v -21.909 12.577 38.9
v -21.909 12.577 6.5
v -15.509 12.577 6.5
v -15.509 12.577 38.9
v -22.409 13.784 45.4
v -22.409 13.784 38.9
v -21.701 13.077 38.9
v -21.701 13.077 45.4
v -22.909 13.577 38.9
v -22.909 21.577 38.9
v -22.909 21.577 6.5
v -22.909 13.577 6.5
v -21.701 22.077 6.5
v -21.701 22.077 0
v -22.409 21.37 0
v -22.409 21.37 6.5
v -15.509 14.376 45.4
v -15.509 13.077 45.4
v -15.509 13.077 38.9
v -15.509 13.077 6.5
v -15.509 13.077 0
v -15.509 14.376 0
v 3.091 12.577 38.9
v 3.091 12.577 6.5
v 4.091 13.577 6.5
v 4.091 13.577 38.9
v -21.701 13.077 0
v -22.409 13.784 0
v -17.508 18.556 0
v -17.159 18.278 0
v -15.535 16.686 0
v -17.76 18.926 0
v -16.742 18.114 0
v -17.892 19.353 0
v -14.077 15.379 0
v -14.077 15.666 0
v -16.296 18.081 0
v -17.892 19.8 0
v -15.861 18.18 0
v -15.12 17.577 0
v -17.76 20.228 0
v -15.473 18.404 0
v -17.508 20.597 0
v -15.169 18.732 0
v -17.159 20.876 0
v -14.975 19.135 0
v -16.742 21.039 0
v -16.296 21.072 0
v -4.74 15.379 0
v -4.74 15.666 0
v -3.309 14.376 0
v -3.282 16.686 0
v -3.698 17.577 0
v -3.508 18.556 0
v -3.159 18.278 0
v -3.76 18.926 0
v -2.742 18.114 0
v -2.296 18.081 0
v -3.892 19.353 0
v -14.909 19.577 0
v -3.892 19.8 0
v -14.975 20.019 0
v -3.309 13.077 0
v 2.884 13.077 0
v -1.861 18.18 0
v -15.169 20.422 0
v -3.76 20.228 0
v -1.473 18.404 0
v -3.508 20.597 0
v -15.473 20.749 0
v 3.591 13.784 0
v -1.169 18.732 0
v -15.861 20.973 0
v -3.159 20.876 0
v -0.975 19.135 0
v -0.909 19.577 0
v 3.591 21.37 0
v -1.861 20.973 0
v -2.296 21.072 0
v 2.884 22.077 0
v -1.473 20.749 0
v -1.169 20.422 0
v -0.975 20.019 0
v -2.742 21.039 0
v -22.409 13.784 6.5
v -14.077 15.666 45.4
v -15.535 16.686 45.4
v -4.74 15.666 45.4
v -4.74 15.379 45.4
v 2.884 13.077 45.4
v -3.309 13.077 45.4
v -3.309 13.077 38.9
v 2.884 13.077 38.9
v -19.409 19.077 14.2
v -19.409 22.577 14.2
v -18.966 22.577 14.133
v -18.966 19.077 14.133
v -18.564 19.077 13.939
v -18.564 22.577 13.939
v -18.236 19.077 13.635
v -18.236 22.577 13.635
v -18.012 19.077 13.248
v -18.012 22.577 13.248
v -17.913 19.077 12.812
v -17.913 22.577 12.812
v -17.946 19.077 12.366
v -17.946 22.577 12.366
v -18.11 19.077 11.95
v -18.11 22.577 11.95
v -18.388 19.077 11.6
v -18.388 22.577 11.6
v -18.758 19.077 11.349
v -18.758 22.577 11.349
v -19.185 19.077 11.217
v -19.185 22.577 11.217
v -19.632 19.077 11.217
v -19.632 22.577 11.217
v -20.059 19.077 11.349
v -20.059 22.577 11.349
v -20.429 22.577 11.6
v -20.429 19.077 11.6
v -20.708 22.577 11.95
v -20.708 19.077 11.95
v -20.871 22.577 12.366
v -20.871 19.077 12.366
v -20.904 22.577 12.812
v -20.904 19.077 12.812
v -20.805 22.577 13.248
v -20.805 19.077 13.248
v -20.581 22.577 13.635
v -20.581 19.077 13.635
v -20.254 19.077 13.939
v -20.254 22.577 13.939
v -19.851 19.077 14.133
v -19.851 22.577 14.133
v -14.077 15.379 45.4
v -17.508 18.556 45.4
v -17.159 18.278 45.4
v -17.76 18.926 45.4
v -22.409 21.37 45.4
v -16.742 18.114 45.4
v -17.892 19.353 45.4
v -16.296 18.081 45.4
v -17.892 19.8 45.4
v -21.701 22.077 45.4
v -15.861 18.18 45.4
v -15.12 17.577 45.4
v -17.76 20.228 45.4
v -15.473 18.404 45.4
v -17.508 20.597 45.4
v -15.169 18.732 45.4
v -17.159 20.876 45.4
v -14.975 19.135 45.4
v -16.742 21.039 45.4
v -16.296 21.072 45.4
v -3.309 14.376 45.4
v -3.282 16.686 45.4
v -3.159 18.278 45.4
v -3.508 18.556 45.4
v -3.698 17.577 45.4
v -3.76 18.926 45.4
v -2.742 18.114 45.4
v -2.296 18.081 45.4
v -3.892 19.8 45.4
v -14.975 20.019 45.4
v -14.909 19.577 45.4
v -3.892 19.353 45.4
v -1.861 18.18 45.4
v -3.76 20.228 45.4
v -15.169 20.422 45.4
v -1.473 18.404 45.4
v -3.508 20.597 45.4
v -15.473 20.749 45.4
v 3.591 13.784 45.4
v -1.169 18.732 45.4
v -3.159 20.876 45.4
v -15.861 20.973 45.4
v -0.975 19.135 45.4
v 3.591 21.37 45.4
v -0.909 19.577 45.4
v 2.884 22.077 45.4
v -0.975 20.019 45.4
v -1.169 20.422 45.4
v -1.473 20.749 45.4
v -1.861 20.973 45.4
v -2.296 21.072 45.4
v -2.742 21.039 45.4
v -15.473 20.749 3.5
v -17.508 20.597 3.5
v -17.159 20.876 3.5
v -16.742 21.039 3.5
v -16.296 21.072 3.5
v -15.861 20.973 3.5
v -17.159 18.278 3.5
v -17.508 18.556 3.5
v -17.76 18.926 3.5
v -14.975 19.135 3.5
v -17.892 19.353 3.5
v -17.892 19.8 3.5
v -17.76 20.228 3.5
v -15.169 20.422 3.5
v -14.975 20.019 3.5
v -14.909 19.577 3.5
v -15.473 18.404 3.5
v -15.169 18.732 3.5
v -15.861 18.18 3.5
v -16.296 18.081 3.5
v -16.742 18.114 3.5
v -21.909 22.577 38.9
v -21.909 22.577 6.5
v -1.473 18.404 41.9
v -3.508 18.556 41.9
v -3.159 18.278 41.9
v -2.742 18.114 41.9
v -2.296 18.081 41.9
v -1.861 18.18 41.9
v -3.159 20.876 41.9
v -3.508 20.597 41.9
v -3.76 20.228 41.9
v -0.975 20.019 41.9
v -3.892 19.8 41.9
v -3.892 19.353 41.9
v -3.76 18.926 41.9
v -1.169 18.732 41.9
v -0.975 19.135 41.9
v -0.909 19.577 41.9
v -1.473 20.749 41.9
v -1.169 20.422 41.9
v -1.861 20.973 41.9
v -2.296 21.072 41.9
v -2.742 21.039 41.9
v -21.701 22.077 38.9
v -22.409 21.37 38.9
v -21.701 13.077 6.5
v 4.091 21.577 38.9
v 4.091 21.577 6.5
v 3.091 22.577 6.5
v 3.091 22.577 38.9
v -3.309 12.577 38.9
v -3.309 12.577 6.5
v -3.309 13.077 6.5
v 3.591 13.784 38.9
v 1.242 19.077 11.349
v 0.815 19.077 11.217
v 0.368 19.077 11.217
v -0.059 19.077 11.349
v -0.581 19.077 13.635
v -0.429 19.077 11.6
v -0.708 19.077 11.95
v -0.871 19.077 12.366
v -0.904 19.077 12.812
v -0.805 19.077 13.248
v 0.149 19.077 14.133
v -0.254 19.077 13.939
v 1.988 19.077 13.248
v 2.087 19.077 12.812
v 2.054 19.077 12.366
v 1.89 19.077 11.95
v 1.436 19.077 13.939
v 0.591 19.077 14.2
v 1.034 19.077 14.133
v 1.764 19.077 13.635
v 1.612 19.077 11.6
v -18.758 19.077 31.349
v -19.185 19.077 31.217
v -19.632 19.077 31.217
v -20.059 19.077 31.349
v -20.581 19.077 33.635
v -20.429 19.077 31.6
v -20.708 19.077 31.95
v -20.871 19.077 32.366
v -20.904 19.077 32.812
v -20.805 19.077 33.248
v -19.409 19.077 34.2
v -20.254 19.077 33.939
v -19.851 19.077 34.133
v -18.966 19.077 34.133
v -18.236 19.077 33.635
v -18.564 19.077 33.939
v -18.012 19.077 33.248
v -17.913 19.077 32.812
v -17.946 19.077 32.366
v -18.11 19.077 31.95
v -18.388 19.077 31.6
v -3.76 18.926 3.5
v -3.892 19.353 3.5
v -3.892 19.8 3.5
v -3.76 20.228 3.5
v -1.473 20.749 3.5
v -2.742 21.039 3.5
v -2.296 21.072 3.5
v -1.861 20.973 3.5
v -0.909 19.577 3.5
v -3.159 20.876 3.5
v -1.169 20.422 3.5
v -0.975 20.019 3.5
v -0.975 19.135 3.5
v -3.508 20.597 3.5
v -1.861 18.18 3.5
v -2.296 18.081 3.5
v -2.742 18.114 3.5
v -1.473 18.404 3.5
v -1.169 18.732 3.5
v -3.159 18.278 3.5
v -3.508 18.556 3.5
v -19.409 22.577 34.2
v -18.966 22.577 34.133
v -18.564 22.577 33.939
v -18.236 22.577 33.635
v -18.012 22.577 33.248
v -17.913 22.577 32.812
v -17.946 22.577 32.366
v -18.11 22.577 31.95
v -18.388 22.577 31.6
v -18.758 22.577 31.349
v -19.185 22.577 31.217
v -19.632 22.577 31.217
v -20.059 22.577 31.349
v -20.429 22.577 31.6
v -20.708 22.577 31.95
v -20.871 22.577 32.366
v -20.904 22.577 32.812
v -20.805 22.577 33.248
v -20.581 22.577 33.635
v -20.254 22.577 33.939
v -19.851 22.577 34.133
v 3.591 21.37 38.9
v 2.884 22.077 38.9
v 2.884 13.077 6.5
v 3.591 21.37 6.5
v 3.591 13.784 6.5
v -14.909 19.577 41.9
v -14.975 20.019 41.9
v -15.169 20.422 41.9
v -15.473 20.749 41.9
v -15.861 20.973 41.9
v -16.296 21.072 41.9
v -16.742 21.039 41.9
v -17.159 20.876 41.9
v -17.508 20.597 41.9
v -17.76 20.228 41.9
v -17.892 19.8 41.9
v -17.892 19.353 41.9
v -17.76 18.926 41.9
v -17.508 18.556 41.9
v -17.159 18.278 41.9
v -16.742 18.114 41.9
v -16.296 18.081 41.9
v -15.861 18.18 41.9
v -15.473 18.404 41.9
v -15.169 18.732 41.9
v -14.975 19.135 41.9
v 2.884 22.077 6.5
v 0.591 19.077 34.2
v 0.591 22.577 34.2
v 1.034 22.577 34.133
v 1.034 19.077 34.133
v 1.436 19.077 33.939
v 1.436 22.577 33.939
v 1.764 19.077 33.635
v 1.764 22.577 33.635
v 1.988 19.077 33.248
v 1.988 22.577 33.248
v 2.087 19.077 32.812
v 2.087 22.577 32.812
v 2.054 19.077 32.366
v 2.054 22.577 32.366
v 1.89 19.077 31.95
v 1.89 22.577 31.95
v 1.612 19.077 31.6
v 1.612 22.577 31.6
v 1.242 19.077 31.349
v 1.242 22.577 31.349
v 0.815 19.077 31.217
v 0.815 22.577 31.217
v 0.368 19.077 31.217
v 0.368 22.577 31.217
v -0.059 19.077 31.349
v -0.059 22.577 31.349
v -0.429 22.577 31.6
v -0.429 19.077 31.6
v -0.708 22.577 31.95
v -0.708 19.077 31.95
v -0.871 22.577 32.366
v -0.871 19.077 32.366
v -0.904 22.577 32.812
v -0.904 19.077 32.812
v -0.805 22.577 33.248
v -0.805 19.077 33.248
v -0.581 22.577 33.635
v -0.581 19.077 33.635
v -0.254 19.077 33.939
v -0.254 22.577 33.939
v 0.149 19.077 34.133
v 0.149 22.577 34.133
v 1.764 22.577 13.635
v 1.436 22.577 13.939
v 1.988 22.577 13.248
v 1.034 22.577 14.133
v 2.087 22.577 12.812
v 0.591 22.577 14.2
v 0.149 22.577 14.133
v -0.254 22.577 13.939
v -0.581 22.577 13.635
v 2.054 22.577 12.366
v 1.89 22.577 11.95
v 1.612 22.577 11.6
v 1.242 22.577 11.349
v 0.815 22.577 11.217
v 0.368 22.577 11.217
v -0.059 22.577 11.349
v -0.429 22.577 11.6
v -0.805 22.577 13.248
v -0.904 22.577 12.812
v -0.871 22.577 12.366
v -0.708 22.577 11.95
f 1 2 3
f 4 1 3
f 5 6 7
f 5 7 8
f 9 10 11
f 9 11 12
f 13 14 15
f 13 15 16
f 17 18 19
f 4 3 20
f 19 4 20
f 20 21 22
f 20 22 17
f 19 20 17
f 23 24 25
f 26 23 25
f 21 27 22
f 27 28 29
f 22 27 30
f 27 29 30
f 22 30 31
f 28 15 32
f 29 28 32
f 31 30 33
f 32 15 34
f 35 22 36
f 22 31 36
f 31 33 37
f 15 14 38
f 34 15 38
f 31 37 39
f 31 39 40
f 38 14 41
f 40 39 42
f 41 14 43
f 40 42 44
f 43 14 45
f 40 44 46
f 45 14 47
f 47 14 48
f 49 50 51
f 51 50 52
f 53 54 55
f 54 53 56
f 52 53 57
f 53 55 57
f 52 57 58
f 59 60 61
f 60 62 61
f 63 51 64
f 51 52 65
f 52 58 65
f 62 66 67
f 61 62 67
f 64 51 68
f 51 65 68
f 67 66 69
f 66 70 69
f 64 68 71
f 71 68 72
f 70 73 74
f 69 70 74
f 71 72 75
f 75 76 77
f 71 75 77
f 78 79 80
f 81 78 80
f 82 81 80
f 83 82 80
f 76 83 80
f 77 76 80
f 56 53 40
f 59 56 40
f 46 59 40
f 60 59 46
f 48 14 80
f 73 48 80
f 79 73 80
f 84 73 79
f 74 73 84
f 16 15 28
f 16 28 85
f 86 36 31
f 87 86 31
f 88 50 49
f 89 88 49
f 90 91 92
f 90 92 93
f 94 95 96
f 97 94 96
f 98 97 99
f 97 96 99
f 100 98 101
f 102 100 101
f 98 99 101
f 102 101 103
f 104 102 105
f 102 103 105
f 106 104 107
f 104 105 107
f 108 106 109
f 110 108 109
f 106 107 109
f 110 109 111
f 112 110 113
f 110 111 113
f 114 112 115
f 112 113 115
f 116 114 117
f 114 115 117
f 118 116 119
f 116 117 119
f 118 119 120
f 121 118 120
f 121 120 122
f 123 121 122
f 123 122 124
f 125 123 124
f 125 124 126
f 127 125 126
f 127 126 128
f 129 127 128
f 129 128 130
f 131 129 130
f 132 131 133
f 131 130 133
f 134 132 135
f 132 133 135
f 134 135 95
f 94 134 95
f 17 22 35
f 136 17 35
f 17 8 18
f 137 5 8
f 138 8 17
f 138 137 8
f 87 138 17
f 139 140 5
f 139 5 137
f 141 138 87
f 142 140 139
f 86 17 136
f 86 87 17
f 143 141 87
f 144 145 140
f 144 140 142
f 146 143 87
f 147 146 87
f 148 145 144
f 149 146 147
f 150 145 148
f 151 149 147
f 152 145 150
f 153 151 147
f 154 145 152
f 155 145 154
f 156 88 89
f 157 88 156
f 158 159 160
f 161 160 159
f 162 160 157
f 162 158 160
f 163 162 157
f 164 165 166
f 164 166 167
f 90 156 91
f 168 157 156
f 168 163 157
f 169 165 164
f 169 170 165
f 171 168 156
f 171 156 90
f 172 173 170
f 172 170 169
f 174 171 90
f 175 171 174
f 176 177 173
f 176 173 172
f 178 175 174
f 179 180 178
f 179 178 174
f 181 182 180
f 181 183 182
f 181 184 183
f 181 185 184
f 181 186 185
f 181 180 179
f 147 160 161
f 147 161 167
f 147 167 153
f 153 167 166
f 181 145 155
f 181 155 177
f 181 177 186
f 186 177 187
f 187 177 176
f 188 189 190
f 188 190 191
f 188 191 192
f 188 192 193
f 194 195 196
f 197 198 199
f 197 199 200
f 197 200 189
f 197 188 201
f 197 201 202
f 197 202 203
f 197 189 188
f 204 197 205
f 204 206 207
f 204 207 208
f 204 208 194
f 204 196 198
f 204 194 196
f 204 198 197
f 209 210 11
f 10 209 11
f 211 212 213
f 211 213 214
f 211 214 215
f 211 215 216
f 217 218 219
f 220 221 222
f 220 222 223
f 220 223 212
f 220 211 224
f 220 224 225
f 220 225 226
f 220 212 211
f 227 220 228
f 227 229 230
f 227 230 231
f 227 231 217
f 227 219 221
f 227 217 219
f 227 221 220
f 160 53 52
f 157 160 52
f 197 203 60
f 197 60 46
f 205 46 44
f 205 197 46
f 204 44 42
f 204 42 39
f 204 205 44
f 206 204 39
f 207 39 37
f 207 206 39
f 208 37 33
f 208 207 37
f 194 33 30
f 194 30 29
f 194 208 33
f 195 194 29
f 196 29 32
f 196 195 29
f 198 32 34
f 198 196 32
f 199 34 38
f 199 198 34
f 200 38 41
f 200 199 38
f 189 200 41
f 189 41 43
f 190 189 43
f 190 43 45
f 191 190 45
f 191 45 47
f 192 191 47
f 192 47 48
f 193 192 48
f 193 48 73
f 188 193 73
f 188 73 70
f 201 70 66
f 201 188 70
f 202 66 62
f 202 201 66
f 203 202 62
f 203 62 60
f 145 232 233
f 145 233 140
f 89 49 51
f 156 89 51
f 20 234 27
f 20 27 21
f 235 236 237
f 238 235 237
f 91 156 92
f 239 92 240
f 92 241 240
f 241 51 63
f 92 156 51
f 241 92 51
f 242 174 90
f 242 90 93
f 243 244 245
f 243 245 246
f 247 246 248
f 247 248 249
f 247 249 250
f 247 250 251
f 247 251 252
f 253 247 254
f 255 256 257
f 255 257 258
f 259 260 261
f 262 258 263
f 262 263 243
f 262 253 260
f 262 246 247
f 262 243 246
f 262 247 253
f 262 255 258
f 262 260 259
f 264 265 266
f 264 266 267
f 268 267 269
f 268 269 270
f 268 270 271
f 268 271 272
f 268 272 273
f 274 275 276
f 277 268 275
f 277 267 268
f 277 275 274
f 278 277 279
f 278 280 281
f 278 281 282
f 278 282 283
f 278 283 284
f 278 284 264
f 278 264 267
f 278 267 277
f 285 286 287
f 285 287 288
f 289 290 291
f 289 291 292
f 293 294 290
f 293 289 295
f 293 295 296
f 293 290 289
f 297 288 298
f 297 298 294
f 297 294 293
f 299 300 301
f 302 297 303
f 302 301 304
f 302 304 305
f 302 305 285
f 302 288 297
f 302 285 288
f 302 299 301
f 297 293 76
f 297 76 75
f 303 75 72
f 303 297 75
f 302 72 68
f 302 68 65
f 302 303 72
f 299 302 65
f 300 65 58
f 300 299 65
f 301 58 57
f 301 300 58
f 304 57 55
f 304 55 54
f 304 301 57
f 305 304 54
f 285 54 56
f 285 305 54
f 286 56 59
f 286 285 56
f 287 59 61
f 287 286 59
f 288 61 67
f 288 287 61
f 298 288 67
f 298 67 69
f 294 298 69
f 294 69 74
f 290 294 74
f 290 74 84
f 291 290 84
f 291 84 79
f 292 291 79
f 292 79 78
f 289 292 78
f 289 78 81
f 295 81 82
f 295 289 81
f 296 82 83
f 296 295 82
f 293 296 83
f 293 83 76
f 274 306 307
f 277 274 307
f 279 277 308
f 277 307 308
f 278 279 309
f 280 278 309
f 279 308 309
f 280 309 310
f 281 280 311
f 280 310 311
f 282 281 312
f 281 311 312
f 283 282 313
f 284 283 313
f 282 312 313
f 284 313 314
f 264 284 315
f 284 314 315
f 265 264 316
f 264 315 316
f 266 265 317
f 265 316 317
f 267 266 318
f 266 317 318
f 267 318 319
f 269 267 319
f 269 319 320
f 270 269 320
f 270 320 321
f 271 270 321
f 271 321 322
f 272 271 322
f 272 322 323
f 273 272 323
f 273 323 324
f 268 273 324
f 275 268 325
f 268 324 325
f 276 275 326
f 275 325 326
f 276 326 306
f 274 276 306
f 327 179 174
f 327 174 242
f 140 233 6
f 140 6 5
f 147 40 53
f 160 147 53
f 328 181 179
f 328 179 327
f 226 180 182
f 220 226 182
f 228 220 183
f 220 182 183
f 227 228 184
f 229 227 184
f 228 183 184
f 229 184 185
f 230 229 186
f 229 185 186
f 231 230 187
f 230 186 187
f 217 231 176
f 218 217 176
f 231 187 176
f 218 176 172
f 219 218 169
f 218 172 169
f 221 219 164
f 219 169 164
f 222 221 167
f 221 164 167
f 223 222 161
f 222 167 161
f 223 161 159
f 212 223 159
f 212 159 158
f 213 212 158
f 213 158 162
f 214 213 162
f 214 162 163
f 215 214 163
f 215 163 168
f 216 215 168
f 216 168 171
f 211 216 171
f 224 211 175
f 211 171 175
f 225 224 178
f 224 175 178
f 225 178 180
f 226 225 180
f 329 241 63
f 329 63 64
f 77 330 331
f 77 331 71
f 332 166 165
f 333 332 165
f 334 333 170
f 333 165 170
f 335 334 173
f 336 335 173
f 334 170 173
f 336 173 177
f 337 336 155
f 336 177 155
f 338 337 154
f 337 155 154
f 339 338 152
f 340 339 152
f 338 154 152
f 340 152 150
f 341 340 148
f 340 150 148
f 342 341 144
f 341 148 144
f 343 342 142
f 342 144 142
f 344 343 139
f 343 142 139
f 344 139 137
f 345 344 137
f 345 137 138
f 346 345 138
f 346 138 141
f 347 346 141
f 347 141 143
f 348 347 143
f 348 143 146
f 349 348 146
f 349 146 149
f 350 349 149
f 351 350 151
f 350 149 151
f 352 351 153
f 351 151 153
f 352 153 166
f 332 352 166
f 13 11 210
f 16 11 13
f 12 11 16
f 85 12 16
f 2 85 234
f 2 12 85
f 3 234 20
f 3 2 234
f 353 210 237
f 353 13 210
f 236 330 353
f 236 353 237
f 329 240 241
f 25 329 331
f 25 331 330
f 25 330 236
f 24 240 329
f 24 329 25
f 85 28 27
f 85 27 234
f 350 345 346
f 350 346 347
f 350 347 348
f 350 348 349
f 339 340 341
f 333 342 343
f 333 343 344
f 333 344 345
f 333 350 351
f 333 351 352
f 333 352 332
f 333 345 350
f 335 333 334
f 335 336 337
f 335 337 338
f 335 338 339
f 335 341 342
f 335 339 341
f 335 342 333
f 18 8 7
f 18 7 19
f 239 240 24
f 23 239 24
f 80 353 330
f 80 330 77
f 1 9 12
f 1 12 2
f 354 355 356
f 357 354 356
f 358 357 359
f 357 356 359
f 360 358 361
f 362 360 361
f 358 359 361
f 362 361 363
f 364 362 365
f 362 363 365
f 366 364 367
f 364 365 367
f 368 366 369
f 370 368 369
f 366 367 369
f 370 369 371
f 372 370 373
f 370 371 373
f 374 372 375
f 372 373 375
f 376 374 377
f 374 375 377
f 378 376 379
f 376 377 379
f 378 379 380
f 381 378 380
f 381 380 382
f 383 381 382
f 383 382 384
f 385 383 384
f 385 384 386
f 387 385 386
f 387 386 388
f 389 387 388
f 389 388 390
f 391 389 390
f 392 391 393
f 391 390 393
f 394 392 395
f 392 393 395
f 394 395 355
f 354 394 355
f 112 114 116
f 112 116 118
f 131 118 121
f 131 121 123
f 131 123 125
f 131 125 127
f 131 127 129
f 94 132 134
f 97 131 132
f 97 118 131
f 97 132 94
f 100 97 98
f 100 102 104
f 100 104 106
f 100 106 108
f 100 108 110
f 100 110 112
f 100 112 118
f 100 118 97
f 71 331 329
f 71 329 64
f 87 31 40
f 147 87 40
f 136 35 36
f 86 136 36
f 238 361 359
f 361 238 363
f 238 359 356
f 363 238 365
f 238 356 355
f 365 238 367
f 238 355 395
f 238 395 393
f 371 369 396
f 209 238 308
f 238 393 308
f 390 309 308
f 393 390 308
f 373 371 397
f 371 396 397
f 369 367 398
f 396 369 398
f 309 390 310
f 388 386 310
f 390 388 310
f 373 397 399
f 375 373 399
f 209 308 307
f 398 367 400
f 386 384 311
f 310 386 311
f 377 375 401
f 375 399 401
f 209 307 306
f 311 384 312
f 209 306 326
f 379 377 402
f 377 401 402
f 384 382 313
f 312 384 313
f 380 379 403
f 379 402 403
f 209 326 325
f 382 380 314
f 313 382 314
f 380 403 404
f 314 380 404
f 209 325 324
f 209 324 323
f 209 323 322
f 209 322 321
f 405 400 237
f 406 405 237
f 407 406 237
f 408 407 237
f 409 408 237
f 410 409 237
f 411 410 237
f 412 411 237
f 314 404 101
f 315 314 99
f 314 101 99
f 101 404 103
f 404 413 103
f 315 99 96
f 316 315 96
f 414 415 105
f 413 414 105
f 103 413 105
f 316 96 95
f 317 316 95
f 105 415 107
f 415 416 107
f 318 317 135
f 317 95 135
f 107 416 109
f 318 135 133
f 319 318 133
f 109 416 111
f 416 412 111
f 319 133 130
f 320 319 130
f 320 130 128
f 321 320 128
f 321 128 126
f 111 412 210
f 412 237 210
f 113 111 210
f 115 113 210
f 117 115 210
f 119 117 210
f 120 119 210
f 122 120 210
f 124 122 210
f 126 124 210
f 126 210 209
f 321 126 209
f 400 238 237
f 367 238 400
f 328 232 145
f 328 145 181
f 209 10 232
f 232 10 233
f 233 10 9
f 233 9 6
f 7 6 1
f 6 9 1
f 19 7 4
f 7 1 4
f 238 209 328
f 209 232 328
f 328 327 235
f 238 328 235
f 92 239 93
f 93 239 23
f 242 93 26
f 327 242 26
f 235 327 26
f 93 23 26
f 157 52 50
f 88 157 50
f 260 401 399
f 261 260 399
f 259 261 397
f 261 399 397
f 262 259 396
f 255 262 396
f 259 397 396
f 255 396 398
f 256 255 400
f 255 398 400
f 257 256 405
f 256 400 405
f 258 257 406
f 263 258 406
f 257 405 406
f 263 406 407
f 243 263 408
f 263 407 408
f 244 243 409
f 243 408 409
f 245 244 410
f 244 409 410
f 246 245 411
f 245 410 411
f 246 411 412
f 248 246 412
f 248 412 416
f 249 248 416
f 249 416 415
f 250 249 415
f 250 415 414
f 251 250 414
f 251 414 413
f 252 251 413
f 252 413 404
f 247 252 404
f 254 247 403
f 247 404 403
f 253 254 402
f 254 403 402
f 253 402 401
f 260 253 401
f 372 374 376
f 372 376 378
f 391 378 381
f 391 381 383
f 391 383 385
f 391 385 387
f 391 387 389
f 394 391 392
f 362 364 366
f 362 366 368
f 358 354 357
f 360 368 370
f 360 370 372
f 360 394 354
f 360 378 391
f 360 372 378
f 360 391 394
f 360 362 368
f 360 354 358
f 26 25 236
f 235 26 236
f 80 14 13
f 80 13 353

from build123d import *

# Parameters (mm, degrees)
EXTRUDE_1_DEPTH      = 45.4
SKETCH_2_W           = 25
SKETCH_2_H           = 6.5
CUT_EXTRUDE_1_DEPTH  = 0.5
SKETCH_3_W           = 6.5
SKETCH_3_H           = 1.414213562
CUT_EXTRUDE_2_DEPTH  = 0.5
SKETCH_4_W           = 6.5
SKETCH_4_H           = 8
CUT_EXTRUDE_3_DEPTH  = 0.5
SKETCH_5_W           = 6.5
SKETCH_5_H           = 1.414213562
CUT_EXTRUDE_4_DEPTH  = 0.5
SKETCH_6_W           = 6.4
SKETCH_6_H           = 6.5
CUT_EXTRUDE_5_DEPTH  = 0.5
SKETCH_7_W           = 6.5
SKETCH_7_H           = 1.414213563
CUT_EXTRUDE_6_DEPTH  = 0.5
SKETCH_8_W           = 6.5
SKETCH_8_H           = 8
CUT_EXTRUDE_7_DEPTH  = 0.5
SKETCH_9_W           = 6.5
SKETCH_9_H           = 1.414213562
CUT_EXTRUDE_8_DEPTH  = 0.5
SKETCH_10_W          = 6.4
SKETCH_10_H          = 6.5
CUT_EXTRUDE_9_DEPTH  = 0.5
SKETCH_11_W          = 25
SKETCH_11_H          = 6.5
CUT_EXTRUDE_10_DEPTH = 0.5
SKETCH_12_W          = 6.5
SKETCH_12_H          = 1.414213563
CUT_EXTRUDE_11_DEPTH = 0.5
SKETCH_13_W          = 6.5
SKETCH_13_H          = 8
CUT_EXTRUDE_12_DEPTH = 0.5
SKETCH_14_W          = 6.5
SKETCH_14_H          = 1.414213562
CUT_EXTRUDE_13_DEPTH = 0.5
SKETCH_15_W          = 6.4
SKETCH_15_H          = 6.5
CUT_EXTRUDE_14_DEPTH = 0.5
SKETCH_16_W          = 6.5
SKETCH_16_H          = 1.414213562
CUT_EXTRUDE_15_DEPTH = 0.5
SKETCH_17_W          = 6.5
SKETCH_17_H          = 8
CUT_EXTRUDE_16_DEPTH = 0.5
SKETCH_18_W          = 6.5
SKETCH_18_H          = 1.414213562
CUT_EXTRUDE_17_DEPTH = 0.5
SKETCH_19_W          = 6.4
SKETCH_19_H          = 6.5
CUT_EXTRUDE_18_DEPTH = 0.5
SKETCH_20_R          = 1.5
CUT_EXTRUDE_19_DEPTH = 3.5
SKETCH_21_R          = 1.5
CUT_EXTRUDE_21_DEPTH = 3.5
CUT_EXTRUDE_START    = -3.5
SKETCH_22_R          = 1.5
CUT_EXTRUDE_22_DEPTH = 3.5


with BuildPart() as part:
    # 草图1 → 凸台-拉伸1 (new body)
    with BuildSketch(Plane.XY):
        Polygon((-15.119558261, 17.576687619), (-3.69760958, 17.576687619), (-3.282491259, 16.686463507), (-4.740379733, 15.665639007), (-4.740379733, 15.378970272), (-3.30858392, 14.37641605), (-3.30858392, 12.576687619), (3.09141608, 12.576687619), (4.09141608, 13.576687619), (4.09141608, 21.576687619), (3.09141608, 22.576687619), (-21.90858392, 22.576687619), (-22.90858392, 21.576687619), (-22.90858392, 13.576687619), (-21.90858392, 12.576687619), (-15.50858392, 12.576687619), (-15.50858392, 14.37641605), (-14.076788108, 15.378970272), (-14.076788108, 15.665639007), (-15.534676582, 16.686463507), align=None)
    extrude(amount=EXTRUDE_1_DEPTH)

    # 草图2 → 切除-拉伸1 (cut)
    with BuildSketch(Plane(origin=(0, 22.576687619, 0), x_dir=(1, 0, 0), z_dir=(0, 1, 0))):
        with Locations((-9.40858392, -3.25)):
            Rectangle(SKETCH_2_W, SKETCH_2_H)
    extrude(amount=-CUT_EXTRUDE_1_DEPTH, mode=Mode.SUBTRACT)

    # 草图3 → 切除-拉伸2 (cut)
    with BuildSketch(Plane(origin=(-22.24263577, 22.24263577, 0), x_dir=(0, 0, 1), z_dir=(-0.7071067811865477, 0.7071067811865475, 0))):
        with Locations((3.25, -0.234686125)):
            Rectangle(SKETCH_3_W, SKETCH_3_H)
    extrude(amount=-CUT_EXTRUDE_2_DEPTH, mode=Mode.SUBTRACT)

    # 草图4 → 切除-拉伸3 (cut)
    with BuildSketch(Plane.ZY.offset(22.90858392)):
        with Locations((3.25, 17.576687619)):
            Rectangle(SKETCH_4_W, SKETCH_4_H)
    extrude(amount=-CUT_EXTRUDE_3_DEPTH, mode=Mode.SUBTRACT)

    # 草图5 → 切除-拉伸4 (cut)
    with BuildSketch(Plane(origin=(-4.665948151, -4.665948151, 0), x_dir=(0, 0, 1), z_dir=(-0.7071067811865469, -0.7071067811865481, 0))):
        with Locations((3.25, 25.091876138)):
            Rectangle(SKETCH_5_W, SKETCH_5_H)
    extrude(amount=-CUT_EXTRUDE_4_DEPTH, mode=Mode.SUBTRACT)

    # 草图6 → 切除-拉伸5 (cut)
    with BuildSketch(Plane.XZ.offset(-12.576687619)):
        with Locations((-18.70858392, 3.25)):
            Rectangle(SKETCH_6_W, SKETCH_6_H)
    extrude(amount=-CUT_EXTRUDE_5_DEPTH, mode=Mode.SUBTRACT)

    # 草图7 → 切除-拉伸6 (cut)
    with BuildSketch(Plane(origin=(12.834051849, 12.834051849, 0), x_dir=(0, 0, -1), z_dir=(0.7071067811865478, 0.7071067811865472, 0))):
        with Locations((-3.25, 13.071060858)):
            Rectangle(SKETCH_7_W, SKETCH_7_H)
    extrude(amount=-CUT_EXTRUDE_6_DEPTH, mode=Mode.SUBTRACT)

    # 草图8 → 切除-拉伸7 (cut)
    with BuildSketch(Plane(origin=(4.09141608, 0, 0), x_dir=(0, 0, -1), z_dir=(1, 0, 0))):
        with Locations((-3.25, 17.576687619)):
            Rectangle(SKETCH_8_W, SKETCH_8_H)
    extrude(amount=-CUT_EXTRUDE_7_DEPTH, mode=Mode.SUBTRACT)

    # 草图9 → 切除-拉伸8 (cut)
    with BuildSketch(Plane(origin=(-4.74263577, 4.74263577, 0), x_dir=(0, 0, -1), z_dir=(0.7071067811865472, -0.7071067811865478, 0))):
        with Locations((-3.25, 11.786129155)):
            Rectangle(SKETCH_9_W, SKETCH_9_H)
    extrude(amount=-CUT_EXTRUDE_8_DEPTH, mode=Mode.SUBTRACT)

    # 草图10 → 切除-拉伸9 (cut)
    with BuildSketch(Plane.XZ.offset(-12.576687619)):
        with Locations((-0.10858392, 3.25)):
            Rectangle(SKETCH_10_W, SKETCH_10_H)
    extrude(amount=-CUT_EXTRUDE_9_DEPTH, mode=Mode.SUBTRACT)

    # 草图11 → 切除-拉伸10 (cut)
    with BuildSketch(Plane(origin=(0, 22.576687619, 0), x_dir=(1, 0, 0), z_dir=(0, 1, 0))):
        with Locations((-9.40858392, -42.15)):
            Rectangle(SKETCH_11_W, SKETCH_11_H)
    extrude(amount=-CUT_EXTRUDE_10_DEPTH, mode=Mode.SUBTRACT)

    # 草图12 → 切除-拉伸11 (cut)
    with BuildSketch(Plane(origin=(12.834051849, 12.834051849, 0), x_dir=(0, 0, -1), z_dir=(0.7071067811865478, 0.7071067811865472, 0))):
        with Locations((-42.15, 13.071060858)):
            Rectangle(SKETCH_12_W, SKETCH_12_H)
    extrude(amount=-CUT_EXTRUDE_11_DEPTH, mode=Mode.SUBTRACT)

    # 草图13 → 切除-拉伸12 (cut)
    with BuildSketch(Plane(origin=(4.09141608, 0, 0), x_dir=(0, 0, -1), z_dir=(1, 0, 0))):
        with Locations((-42.15, 17.576687619)):
            Rectangle(SKETCH_13_W, SKETCH_13_H)
    extrude(amount=-CUT_EXTRUDE_12_DEPTH, mode=Mode.SUBTRACT)

    # 草图14 → 切除-拉伸13 (cut)
    with BuildSketch(Plane(origin=(-4.74263577, 4.74263577, 0), x_dir=(0, 0, -1), z_dir=(0.7071067811865472, -0.7071067811865478, 0))):
        with Locations((-42.15, 11.786129155)):
            Rectangle(SKETCH_14_W, SKETCH_14_H)
    extrude(amount=-CUT_EXTRUDE_13_DEPTH, mode=Mode.SUBTRACT)

    # 草图15 → 切除-拉伸14 (cut)
    with BuildSketch(Plane.XZ.offset(-12.576687619)):
        with Locations((-0.10858392, 42.15)):
            Rectangle(SKETCH_15_W, SKETCH_15_H)
    extrude(amount=-CUT_EXTRUDE_14_DEPTH, mode=Mode.SUBTRACT)

    # 草图16 → 切除-拉伸15 (cut)
    with BuildSketch(Plane(origin=(-22.24263577, 22.24263577, 0), x_dir=(0, 0, 1), z_dir=(-0.7071067811865477, 0.7071067811865475, 0))):
        with Locations((42.15, -0.234686125)):
            Rectangle(SKETCH_16_W, SKETCH_16_H)
    extrude(amount=-CUT_EXTRUDE_15_DEPTH, mode=Mode.SUBTRACT)

    # 草图17 → 切除-拉伸16 (cut)
    with BuildSketch(Plane.ZY.offset(22.90858392)):
        with Locations((42.15, 17.576687619)):
            Rectangle(SKETCH_17_W, SKETCH_17_H)
    extrude(amount=-CUT_EXTRUDE_16_DEPTH, mode=Mode.SUBTRACT)

    # 草图18 → 切除-拉伸17 (cut)
    with BuildSketch(Plane(origin=(-4.665948151, -4.665948151, 0), x_dir=(0, 0, 1), z_dir=(-0.7071067811865469, -0.7071067811865481, 0))):
        with Locations((42.15, 25.091876138)):
            Rectangle(SKETCH_18_W, SKETCH_18_H)
    extrude(amount=-CUT_EXTRUDE_17_DEPTH, mode=Mode.SUBTRACT)

    # 草图19 → 切除-拉伸18 (cut)
    with BuildSketch(Plane.XZ.offset(-12.576687619)):
        with Locations((-18.70858392, 42.15)):
            Rectangle(SKETCH_19_W, SKETCH_19_H)
    extrude(amount=-CUT_EXTRUDE_18_DEPTH, mode=Mode.SUBTRACT)

    # 草图20 → 切除-拉伸19 (cut)
    with BuildSketch(Plane(origin=(0, 22.576687619, 0), x_dir=(1, 0, 0), z_dir=(0, 1, 0))):
        with Locations(Location((-19.40858392, -12.7, 0), (0, 0, 270))):
            Circle(SKETCH_20_R)
        with Locations(Location((0.59141608, -12.7, 0), (0, 0, 270))):
            Circle(SKETCH_20_R)
        with Locations(Location((0.59141608, -32.7, 0), (0, 0, 270))):
            Circle(SKETCH_20_R)
        with Locations(Location((-19.40858392, -32.7, 0), (0, 0, 270))):
            Circle(SKETCH_20_R)
    extrude(amount=-CUT_EXTRUDE_19_DEPTH, mode=Mode.SUBTRACT)

    # 草图21 → 切除-拉伸21 (cut)
    with BuildSketch(Plane.XY.offset(45.4)):
        with Locations((-16.40858392, 19.576687619)):
            Circle(SKETCH_21_R)
        with Locations((-2.40858392, 19.576687619)):
            Circle(SKETCH_21_R)
    extrude(amount=-CUT_EXTRUDE_21_DEPTH, mode=Mode.SUBTRACT)

    # 草图22 → 切除-拉伸22 (cut)
    with BuildSketch(Plane(origin=(0, 0, 0), x_dir=(-1, 0, 0), z_dir=(0, 0, -1)).offset(CUT_EXTRUDE_START)):
        with Locations(Location((2.40858392, 19.576687619, 0), (0, 0, 180))):
            Circle(SKETCH_22_R)
        with Locations(Location((16.40858392, 19.576687619, 0), (0, 0, 180))):
            Circle(SKETCH_22_R)
    extrude(amount=CUT_EXTRUDE_22_DEPTH, mode=Mode.SUBTRACT)


solid = part.part
